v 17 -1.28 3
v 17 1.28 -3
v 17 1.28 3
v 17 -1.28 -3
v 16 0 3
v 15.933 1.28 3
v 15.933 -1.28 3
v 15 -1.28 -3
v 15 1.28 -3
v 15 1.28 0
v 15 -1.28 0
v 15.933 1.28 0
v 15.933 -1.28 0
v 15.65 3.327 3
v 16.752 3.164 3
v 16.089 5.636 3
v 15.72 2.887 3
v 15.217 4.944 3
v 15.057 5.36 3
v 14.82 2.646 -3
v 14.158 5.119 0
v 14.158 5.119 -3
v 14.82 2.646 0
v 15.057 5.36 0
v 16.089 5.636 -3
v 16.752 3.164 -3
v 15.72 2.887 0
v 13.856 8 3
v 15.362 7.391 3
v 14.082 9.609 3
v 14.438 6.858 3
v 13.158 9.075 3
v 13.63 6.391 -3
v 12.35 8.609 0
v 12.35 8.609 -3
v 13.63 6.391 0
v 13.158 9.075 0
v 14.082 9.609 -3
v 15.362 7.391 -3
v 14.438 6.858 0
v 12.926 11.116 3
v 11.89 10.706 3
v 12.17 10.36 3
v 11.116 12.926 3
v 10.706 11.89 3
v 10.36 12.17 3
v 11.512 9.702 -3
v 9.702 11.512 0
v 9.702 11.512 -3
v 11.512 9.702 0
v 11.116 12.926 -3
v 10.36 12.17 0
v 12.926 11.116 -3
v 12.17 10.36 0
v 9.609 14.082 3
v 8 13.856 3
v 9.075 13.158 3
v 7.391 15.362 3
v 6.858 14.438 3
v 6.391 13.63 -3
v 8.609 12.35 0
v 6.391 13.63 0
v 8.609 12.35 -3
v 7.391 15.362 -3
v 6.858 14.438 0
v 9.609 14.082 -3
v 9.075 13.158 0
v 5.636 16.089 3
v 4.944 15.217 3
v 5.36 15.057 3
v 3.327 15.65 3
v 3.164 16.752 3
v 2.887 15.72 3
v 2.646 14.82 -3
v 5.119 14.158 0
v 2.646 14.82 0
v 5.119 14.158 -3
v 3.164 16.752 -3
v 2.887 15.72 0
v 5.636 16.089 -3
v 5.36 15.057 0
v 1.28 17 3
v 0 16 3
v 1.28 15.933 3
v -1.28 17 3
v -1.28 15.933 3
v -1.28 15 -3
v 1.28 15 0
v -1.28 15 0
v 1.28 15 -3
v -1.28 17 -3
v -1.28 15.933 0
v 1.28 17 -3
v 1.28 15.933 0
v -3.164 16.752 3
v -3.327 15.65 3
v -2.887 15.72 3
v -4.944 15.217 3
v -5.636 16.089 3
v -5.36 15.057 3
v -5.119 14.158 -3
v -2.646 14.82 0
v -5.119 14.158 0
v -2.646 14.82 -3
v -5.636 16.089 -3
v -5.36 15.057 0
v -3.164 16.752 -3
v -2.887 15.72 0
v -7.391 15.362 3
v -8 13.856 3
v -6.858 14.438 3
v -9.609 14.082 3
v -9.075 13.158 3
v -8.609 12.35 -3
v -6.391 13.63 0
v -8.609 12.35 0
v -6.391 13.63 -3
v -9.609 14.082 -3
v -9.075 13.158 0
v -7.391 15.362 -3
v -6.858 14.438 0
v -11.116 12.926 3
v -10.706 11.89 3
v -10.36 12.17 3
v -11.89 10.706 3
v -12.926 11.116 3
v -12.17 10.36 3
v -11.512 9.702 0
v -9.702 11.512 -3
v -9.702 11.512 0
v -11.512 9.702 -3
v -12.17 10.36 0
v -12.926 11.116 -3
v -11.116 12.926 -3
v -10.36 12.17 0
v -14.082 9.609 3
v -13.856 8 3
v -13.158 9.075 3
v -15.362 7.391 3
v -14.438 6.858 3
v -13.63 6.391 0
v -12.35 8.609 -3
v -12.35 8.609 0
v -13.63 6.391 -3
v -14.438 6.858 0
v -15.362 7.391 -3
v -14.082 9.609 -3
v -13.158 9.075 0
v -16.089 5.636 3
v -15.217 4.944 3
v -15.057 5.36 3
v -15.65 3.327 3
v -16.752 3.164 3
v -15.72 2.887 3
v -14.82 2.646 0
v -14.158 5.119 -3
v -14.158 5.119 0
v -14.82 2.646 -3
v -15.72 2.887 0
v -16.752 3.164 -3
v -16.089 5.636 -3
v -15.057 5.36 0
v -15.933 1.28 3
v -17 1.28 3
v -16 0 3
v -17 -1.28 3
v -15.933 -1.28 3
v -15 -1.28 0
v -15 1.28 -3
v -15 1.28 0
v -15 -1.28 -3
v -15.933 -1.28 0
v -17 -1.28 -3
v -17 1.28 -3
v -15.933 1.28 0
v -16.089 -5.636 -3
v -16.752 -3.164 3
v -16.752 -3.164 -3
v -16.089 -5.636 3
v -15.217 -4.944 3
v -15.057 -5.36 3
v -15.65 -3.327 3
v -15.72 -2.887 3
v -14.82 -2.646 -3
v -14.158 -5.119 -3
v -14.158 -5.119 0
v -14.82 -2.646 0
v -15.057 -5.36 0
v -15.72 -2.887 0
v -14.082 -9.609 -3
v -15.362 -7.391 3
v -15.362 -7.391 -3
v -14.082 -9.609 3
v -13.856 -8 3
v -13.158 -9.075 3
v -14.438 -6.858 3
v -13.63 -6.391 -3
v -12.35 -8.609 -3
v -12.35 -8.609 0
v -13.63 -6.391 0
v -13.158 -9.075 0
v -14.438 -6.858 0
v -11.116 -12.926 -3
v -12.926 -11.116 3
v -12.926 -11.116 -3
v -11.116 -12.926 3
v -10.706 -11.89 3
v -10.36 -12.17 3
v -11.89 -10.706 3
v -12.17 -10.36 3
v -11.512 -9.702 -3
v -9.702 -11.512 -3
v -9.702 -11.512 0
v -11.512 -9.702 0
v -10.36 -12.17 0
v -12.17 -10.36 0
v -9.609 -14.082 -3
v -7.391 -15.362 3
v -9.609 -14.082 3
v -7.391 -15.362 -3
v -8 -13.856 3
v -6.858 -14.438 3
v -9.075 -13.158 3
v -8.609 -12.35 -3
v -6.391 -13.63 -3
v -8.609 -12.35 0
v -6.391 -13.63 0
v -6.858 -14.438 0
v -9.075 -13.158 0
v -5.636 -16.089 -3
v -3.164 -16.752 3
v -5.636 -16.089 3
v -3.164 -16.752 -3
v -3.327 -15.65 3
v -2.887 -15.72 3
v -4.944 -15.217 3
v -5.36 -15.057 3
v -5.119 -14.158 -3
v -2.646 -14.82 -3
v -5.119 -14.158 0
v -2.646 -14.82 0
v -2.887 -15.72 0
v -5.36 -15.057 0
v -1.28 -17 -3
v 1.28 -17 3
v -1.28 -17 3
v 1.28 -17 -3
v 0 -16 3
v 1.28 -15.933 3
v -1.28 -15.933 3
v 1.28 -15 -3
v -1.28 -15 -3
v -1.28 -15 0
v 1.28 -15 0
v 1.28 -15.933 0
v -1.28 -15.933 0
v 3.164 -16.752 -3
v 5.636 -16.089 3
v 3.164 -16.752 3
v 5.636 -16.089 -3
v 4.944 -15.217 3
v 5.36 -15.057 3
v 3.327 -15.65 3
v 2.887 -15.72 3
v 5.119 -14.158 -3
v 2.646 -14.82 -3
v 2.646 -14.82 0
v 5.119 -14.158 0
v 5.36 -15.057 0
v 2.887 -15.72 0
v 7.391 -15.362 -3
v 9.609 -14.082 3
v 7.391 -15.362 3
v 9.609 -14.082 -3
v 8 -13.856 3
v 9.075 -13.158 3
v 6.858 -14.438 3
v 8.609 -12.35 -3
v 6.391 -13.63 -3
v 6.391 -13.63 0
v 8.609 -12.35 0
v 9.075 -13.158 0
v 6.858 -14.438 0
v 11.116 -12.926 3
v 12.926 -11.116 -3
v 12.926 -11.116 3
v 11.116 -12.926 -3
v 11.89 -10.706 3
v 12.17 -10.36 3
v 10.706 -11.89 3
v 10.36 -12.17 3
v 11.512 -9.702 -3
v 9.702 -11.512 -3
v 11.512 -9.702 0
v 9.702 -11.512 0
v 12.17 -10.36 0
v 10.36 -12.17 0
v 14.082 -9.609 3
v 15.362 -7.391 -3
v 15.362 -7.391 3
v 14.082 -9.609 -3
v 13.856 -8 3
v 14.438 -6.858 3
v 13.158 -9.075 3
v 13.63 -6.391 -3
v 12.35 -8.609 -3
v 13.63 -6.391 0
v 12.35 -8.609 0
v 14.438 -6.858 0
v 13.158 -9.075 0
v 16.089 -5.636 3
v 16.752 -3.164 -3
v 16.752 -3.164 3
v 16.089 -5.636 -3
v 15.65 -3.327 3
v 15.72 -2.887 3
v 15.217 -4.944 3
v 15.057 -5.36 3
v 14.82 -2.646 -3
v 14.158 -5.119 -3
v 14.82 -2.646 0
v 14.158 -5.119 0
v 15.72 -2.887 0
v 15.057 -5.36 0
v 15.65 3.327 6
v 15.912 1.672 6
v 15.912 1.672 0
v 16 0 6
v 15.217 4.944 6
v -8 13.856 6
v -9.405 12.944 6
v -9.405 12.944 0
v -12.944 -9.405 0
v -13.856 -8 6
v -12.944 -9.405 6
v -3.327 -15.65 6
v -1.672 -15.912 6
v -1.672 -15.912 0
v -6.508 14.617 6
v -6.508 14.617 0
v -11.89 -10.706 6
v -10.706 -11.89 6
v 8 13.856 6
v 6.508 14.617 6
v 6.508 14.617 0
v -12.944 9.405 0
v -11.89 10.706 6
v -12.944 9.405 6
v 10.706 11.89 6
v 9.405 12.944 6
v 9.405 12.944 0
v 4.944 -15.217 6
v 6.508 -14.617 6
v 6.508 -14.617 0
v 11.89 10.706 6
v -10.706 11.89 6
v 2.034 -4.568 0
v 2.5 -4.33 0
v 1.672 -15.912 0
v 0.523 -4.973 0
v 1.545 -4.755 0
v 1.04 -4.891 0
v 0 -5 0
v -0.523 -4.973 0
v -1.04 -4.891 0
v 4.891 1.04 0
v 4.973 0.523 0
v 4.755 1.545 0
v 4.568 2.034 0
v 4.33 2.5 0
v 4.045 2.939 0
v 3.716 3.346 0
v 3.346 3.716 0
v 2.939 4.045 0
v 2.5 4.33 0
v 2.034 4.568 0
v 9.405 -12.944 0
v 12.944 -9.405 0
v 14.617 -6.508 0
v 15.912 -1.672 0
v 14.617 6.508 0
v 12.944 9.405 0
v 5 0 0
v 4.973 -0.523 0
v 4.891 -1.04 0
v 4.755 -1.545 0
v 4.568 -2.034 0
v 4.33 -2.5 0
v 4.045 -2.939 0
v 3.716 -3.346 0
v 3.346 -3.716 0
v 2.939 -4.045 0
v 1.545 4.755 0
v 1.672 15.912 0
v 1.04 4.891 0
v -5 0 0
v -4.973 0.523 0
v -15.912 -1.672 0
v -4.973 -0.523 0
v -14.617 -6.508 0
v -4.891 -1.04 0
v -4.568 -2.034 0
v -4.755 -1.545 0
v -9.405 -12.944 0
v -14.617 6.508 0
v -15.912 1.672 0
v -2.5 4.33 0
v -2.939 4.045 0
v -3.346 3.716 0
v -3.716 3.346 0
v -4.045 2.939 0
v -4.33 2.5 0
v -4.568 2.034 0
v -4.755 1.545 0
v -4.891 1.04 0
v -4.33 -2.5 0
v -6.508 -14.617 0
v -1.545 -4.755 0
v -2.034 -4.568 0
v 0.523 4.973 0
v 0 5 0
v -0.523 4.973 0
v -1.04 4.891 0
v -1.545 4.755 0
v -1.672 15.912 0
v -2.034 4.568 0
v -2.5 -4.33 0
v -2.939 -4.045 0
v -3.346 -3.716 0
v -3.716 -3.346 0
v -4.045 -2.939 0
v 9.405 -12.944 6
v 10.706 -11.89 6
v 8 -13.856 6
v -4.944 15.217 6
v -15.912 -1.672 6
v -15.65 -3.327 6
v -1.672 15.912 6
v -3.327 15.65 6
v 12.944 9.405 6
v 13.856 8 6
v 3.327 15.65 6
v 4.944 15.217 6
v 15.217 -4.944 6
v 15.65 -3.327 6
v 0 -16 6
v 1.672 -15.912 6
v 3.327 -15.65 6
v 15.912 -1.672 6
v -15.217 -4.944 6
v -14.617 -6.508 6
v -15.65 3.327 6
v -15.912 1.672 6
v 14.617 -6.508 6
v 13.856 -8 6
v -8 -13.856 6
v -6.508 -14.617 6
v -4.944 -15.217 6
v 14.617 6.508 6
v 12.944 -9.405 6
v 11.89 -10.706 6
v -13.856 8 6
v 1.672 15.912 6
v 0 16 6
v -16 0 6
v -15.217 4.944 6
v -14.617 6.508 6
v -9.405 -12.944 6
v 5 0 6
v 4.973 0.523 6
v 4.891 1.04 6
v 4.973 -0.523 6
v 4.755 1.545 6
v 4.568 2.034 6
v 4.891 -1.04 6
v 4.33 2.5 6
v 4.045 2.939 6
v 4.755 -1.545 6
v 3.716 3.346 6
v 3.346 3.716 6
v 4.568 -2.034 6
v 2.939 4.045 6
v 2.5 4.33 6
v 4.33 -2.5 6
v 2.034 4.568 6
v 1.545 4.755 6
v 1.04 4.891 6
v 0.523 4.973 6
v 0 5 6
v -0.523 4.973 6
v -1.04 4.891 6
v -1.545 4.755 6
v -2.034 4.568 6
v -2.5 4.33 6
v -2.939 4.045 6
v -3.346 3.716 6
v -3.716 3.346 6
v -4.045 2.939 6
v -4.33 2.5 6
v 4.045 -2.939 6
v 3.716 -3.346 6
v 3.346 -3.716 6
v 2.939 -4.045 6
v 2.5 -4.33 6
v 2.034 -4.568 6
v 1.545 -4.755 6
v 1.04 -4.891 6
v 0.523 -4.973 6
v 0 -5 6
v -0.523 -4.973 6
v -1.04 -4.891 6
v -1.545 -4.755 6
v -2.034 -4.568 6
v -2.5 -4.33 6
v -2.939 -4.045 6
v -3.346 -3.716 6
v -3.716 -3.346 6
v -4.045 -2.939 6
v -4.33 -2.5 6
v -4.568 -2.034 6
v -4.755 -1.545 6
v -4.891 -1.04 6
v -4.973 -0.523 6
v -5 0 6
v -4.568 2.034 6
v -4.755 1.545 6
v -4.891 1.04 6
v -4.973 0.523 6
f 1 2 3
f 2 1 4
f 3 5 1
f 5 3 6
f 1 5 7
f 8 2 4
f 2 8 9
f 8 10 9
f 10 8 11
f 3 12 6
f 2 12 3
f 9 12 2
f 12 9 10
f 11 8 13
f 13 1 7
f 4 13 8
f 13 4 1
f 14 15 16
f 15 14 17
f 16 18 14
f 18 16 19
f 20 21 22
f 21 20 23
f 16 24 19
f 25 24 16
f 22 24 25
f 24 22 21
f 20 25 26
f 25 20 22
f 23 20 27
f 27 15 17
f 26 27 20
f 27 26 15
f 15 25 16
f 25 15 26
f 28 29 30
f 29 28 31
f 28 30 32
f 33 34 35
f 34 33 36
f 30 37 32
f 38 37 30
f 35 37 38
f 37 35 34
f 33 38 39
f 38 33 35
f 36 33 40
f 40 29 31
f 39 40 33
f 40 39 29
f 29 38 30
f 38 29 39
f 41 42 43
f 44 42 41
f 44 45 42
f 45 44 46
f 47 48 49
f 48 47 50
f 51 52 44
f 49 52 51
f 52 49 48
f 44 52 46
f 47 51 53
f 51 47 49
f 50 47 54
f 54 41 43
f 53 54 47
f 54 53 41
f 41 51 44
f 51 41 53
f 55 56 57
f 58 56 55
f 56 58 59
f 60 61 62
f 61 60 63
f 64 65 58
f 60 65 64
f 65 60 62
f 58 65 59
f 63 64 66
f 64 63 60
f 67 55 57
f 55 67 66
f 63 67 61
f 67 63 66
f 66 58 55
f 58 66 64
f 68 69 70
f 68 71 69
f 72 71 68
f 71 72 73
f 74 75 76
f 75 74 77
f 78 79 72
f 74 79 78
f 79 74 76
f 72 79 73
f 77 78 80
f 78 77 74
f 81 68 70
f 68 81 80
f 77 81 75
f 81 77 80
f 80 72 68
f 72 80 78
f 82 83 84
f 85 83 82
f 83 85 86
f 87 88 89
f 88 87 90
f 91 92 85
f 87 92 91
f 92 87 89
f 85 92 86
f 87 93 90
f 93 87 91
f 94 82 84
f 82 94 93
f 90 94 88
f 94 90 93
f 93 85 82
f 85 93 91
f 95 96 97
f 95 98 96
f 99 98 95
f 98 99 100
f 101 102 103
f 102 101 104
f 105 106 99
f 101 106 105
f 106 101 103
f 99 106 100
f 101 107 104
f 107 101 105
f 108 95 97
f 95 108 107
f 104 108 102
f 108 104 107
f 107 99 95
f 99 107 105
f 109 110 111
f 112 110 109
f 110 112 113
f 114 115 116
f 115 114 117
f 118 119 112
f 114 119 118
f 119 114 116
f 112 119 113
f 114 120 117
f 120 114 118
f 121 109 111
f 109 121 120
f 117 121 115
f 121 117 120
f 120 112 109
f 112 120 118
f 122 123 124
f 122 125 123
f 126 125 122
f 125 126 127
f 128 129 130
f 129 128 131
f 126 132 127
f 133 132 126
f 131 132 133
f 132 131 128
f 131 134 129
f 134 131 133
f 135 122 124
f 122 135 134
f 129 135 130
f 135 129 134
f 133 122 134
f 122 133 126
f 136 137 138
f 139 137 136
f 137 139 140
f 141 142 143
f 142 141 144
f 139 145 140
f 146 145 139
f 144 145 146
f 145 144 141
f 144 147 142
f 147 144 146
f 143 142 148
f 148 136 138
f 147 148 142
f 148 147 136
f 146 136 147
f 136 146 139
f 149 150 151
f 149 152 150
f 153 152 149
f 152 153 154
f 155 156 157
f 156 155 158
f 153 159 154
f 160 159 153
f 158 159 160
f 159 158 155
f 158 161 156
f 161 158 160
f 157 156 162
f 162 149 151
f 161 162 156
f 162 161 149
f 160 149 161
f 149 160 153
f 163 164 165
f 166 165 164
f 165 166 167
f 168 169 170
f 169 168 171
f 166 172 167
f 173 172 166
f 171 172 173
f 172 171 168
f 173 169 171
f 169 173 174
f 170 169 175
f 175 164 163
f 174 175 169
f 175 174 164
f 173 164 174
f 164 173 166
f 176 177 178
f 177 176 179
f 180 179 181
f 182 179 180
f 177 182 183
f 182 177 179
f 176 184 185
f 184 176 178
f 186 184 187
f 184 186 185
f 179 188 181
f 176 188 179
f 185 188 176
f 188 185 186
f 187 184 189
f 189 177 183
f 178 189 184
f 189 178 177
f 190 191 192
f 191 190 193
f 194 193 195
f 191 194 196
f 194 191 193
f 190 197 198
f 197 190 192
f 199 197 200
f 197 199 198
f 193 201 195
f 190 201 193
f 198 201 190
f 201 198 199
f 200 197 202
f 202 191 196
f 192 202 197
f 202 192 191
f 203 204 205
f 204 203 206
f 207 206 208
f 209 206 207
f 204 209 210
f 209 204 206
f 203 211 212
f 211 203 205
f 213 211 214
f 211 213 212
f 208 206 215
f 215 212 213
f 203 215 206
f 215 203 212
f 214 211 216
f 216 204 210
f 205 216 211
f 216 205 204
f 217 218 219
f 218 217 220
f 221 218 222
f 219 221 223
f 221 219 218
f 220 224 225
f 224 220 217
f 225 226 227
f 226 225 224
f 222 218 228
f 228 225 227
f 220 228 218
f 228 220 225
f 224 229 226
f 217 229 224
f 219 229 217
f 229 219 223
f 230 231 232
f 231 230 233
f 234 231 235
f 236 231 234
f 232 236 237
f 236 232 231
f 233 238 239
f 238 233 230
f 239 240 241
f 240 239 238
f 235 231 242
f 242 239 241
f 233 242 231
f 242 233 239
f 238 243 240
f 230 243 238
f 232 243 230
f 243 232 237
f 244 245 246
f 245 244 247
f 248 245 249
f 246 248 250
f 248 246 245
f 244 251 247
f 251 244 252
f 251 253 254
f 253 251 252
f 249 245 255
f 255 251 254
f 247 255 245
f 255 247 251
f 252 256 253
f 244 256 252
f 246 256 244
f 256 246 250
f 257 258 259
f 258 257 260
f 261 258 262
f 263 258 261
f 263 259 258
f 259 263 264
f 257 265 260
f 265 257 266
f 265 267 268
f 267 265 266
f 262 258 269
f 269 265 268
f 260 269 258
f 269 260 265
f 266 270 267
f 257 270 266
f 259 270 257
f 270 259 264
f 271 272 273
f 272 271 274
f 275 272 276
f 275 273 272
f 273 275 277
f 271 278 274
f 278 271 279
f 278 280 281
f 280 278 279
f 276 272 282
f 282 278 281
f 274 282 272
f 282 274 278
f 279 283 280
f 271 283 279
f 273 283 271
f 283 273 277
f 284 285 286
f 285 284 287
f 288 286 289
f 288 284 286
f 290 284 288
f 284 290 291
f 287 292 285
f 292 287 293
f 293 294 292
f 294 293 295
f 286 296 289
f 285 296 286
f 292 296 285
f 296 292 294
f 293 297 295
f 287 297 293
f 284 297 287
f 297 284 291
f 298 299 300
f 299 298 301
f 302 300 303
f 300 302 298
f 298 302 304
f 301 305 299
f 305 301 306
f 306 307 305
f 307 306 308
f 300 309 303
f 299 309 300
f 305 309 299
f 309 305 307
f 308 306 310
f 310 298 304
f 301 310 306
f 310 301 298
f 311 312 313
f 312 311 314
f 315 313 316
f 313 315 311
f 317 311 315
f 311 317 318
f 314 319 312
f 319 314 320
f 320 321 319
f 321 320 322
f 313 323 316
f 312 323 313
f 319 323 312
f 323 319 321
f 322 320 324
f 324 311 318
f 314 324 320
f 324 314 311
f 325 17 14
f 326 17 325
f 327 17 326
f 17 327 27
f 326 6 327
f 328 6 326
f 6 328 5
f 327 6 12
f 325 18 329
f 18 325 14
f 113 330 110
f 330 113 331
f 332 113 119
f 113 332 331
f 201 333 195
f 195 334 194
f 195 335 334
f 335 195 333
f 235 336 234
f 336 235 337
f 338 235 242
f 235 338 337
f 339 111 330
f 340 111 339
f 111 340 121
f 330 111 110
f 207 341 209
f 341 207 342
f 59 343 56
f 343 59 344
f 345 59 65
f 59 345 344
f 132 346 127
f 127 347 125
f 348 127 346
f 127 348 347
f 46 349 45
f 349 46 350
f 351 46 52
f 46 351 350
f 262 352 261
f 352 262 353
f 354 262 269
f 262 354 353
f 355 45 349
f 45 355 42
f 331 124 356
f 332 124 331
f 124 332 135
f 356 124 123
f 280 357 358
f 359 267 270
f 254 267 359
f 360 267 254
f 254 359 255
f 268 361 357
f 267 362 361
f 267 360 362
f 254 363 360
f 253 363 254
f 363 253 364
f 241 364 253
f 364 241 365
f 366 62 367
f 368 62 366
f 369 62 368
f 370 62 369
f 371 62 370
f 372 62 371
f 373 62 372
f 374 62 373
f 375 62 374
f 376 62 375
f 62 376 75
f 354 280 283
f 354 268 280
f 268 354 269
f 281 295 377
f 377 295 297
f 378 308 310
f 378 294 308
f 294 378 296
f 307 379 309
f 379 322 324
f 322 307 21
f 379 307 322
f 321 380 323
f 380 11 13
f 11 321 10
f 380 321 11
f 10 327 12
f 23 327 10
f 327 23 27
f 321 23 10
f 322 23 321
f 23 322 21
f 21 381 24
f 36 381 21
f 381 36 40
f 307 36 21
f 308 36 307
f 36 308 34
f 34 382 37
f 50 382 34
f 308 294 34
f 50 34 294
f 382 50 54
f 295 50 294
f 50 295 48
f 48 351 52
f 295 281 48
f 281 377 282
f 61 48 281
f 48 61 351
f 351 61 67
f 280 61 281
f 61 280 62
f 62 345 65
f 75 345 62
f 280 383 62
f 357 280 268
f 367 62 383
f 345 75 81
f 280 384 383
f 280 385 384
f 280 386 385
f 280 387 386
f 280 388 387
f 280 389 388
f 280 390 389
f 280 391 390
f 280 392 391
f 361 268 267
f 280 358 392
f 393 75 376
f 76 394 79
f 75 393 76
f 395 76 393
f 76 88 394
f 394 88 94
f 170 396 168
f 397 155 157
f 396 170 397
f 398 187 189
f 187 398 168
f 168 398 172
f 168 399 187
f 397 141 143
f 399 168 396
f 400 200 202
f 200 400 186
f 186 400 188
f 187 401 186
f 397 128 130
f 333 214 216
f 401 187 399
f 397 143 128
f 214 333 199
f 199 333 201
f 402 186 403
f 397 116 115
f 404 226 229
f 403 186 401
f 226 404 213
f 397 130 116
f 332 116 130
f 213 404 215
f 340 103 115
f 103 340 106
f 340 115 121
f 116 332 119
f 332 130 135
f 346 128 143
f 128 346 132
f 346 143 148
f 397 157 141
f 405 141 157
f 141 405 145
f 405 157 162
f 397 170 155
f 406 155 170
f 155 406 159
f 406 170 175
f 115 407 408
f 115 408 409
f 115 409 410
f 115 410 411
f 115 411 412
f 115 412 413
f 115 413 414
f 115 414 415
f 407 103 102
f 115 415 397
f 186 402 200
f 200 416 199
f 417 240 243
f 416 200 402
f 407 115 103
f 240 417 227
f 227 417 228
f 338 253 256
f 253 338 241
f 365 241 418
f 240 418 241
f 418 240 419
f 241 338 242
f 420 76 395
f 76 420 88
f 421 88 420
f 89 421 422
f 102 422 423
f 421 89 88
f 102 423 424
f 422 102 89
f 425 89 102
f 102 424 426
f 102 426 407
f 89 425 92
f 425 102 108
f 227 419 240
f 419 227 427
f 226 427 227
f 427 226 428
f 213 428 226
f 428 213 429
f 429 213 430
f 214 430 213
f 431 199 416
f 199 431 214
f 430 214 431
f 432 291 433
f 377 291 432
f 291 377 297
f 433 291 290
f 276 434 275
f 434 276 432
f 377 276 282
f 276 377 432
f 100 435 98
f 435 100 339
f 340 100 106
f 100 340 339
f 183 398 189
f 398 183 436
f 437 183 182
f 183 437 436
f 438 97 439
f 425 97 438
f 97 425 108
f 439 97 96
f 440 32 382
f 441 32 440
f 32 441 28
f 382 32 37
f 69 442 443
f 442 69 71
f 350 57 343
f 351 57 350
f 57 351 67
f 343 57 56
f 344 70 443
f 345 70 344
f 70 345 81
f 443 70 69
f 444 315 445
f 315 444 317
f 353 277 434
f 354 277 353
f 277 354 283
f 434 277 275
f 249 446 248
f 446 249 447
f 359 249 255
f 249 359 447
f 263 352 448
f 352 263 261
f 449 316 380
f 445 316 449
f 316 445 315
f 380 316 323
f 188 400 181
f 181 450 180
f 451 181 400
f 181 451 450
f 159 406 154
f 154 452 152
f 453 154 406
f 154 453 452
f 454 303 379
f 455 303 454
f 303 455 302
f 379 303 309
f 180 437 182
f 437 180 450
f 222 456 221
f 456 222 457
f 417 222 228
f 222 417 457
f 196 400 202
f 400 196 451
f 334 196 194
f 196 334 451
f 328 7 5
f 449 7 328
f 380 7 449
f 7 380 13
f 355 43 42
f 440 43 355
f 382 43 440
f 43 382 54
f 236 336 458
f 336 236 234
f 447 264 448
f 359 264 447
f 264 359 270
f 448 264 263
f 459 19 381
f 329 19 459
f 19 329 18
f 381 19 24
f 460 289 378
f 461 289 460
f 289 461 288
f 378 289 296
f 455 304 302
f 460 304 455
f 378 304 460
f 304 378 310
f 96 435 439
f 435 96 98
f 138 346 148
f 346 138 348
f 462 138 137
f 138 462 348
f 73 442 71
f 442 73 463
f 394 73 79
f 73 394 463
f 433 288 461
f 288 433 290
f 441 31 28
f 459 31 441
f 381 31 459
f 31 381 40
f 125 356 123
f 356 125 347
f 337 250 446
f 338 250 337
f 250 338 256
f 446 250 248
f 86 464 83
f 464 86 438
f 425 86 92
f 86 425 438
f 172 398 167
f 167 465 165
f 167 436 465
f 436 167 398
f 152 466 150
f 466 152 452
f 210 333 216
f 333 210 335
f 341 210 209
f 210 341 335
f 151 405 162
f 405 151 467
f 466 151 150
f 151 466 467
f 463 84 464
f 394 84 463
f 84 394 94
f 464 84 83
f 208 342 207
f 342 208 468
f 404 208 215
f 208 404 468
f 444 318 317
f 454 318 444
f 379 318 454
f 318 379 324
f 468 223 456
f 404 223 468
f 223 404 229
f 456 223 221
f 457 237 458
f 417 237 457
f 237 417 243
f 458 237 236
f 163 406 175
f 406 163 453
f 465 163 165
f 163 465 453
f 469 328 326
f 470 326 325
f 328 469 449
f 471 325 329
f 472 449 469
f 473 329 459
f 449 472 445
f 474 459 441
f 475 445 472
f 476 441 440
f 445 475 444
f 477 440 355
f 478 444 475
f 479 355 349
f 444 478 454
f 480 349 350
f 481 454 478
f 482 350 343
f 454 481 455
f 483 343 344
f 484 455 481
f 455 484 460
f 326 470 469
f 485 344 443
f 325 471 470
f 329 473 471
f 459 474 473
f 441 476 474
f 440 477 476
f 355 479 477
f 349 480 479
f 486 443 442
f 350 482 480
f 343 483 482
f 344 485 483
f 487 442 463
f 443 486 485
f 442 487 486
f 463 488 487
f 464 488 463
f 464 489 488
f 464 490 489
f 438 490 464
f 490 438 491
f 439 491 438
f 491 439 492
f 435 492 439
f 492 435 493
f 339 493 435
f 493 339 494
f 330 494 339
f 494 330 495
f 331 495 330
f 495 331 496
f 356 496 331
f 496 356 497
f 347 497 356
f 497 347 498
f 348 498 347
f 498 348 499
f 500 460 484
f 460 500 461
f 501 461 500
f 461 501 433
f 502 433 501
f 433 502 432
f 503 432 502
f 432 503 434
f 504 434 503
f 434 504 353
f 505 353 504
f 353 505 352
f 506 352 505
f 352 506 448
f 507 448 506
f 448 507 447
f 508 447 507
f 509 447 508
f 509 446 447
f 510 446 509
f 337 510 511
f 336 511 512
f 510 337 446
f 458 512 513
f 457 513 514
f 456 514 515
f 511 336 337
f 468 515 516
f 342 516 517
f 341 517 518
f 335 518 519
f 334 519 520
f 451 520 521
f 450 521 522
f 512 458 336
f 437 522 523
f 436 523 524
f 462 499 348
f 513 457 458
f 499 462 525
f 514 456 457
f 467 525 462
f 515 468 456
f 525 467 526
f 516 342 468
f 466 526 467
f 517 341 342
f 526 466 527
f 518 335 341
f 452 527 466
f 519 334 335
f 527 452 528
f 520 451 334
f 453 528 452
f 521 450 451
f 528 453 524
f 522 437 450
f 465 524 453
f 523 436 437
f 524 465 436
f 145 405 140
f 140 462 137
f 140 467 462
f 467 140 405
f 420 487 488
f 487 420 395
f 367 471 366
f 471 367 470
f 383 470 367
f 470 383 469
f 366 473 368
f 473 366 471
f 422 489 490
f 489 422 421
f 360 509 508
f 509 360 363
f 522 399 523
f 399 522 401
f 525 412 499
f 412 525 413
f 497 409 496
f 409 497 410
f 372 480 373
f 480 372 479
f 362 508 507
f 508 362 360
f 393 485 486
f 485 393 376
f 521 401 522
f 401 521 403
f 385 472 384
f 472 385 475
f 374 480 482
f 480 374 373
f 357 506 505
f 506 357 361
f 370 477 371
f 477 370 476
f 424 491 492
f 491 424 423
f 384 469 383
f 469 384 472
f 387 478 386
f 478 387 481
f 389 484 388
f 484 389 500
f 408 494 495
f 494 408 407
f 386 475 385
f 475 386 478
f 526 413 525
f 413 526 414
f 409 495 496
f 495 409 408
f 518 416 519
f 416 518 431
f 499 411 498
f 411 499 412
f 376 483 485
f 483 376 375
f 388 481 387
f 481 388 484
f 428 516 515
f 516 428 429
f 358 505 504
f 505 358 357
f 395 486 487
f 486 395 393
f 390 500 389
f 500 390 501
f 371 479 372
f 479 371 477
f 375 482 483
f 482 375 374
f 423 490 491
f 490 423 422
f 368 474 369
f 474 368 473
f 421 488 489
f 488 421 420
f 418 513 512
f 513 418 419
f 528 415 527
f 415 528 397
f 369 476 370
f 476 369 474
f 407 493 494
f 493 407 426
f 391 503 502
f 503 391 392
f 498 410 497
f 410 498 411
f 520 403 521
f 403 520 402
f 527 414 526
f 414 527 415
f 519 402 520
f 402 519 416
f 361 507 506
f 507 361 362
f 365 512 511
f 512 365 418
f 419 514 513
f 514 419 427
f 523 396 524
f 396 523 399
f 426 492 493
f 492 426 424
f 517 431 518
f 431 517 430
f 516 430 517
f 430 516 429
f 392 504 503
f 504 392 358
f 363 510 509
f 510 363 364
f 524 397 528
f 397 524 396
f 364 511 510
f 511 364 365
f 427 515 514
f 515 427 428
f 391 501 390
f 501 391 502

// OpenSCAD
// Gear blank with external locator teeth.
$fn = 60;
eps = 0.02;
bore_d = 10;
root_d = 32;
teeth = 24;
thickness = 6;
difference() { union() { cylinder(d=root_d,h=thickness); for(i=[0:teeth-1]) rotate([0,0,i*360/teeth]) translate([root_d/2,0,0]) cube([2,max(2,root_d*0.08),thickness],center=true); } translate([0,0,-eps]) cylinder(d=bore_d,h=thickness+2*eps); }
